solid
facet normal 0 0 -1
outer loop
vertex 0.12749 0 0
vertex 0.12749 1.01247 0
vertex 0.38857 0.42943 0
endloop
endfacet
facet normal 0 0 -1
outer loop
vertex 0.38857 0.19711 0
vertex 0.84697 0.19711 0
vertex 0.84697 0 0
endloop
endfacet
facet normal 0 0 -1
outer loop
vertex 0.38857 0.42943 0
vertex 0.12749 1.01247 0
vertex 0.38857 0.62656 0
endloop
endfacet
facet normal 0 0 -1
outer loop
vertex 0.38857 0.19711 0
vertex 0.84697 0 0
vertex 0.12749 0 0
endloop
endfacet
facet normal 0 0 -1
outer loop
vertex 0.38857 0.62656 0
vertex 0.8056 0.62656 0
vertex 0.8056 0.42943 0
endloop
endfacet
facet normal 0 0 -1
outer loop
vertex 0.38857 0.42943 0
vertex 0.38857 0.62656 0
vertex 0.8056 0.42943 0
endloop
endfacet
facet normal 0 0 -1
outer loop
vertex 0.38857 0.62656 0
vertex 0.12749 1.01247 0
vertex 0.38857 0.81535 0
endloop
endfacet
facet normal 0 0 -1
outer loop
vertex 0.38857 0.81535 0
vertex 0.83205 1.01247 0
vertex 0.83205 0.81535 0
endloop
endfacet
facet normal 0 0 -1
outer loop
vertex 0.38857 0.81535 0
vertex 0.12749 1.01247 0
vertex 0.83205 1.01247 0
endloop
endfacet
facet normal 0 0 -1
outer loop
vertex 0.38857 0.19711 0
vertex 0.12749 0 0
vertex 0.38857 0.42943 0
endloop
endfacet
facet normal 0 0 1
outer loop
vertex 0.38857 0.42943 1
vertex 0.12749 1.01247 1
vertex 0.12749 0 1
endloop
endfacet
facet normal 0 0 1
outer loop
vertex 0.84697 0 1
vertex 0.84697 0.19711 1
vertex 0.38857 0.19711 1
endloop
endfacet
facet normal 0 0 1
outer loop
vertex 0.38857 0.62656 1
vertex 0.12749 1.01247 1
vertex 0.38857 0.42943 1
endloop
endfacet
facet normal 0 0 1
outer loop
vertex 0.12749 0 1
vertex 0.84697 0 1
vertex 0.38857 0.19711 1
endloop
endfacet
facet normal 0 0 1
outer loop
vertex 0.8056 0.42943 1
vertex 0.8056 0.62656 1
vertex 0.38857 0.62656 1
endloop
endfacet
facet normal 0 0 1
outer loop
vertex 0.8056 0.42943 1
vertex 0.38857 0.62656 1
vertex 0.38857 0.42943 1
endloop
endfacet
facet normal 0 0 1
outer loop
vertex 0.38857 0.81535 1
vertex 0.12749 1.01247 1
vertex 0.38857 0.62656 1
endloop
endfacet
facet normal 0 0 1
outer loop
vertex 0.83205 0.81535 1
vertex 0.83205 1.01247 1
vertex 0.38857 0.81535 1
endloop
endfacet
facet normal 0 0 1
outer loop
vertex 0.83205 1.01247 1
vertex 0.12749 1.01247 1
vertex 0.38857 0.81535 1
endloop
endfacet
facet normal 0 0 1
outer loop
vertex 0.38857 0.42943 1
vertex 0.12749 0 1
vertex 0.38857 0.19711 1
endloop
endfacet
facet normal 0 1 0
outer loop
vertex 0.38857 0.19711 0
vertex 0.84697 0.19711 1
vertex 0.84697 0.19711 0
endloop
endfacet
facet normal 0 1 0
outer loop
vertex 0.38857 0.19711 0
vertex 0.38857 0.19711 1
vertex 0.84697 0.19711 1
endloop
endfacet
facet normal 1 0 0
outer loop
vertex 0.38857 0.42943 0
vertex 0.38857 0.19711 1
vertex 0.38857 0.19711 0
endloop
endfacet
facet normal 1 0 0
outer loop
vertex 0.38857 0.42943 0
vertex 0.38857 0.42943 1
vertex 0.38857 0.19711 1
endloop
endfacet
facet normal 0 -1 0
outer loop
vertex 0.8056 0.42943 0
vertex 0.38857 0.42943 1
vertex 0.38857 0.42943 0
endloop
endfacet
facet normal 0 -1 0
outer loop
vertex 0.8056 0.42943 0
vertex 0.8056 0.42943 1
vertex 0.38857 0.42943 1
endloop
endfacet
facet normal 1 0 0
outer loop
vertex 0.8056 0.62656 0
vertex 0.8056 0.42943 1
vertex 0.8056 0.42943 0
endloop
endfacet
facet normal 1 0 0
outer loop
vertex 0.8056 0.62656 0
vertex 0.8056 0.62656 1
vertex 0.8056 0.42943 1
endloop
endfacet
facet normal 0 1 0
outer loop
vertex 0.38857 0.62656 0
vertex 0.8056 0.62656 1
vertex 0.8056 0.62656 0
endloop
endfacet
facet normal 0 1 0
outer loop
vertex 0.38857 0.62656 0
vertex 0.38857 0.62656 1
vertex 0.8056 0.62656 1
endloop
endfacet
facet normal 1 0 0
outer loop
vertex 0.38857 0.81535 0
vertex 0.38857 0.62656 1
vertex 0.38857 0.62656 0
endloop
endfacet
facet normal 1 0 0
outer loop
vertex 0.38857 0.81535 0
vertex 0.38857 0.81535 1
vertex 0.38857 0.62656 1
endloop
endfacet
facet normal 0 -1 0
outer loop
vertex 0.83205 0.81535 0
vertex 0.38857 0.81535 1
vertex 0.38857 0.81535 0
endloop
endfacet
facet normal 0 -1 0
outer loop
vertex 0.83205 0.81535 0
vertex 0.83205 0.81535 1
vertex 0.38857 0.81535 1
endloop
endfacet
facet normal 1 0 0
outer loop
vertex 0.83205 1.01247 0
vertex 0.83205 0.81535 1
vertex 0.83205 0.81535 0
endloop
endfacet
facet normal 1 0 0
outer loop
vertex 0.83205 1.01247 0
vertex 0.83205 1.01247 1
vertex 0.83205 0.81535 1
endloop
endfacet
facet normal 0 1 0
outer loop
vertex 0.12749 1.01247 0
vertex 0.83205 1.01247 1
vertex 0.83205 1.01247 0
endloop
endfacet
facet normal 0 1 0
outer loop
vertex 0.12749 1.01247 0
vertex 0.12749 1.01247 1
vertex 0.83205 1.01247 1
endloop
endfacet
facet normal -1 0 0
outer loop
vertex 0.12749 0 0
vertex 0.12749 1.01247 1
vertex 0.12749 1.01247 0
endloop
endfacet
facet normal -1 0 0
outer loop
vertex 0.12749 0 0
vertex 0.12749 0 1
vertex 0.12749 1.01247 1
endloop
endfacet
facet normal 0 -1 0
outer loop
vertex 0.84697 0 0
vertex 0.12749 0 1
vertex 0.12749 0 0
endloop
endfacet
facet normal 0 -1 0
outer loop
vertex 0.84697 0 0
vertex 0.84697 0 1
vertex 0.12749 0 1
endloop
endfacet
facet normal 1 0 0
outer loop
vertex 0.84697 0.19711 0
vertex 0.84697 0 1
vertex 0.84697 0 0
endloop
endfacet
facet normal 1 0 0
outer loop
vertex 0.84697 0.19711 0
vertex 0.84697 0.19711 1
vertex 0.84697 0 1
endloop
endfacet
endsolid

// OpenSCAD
//------------------------------------------------------
// Mark
// Simple texte
// 5@xes 04/06/2022
// Size Must be 1x1 !
//------------------------------------------------------

$fn=20;
// font = "Gill Sans MT:style=Bold";
// font = "Roboto:style=Bold";
// font = "Leelawadee:style=Bold";
font = "Arial Rounded MT Bold:style=Bold";
// font = "Gill Sans MT:style=Bold";


letter_height = 1;
letter_size =1;

render() translate([0,0,0]) letter("E");


module letter(Txt) {
  color("Red")
  linear_extrude(height = letter_height) {
    text(Txt, size = letter_size, font = font, halign = "left", valign = "baseline");
  }
}                
